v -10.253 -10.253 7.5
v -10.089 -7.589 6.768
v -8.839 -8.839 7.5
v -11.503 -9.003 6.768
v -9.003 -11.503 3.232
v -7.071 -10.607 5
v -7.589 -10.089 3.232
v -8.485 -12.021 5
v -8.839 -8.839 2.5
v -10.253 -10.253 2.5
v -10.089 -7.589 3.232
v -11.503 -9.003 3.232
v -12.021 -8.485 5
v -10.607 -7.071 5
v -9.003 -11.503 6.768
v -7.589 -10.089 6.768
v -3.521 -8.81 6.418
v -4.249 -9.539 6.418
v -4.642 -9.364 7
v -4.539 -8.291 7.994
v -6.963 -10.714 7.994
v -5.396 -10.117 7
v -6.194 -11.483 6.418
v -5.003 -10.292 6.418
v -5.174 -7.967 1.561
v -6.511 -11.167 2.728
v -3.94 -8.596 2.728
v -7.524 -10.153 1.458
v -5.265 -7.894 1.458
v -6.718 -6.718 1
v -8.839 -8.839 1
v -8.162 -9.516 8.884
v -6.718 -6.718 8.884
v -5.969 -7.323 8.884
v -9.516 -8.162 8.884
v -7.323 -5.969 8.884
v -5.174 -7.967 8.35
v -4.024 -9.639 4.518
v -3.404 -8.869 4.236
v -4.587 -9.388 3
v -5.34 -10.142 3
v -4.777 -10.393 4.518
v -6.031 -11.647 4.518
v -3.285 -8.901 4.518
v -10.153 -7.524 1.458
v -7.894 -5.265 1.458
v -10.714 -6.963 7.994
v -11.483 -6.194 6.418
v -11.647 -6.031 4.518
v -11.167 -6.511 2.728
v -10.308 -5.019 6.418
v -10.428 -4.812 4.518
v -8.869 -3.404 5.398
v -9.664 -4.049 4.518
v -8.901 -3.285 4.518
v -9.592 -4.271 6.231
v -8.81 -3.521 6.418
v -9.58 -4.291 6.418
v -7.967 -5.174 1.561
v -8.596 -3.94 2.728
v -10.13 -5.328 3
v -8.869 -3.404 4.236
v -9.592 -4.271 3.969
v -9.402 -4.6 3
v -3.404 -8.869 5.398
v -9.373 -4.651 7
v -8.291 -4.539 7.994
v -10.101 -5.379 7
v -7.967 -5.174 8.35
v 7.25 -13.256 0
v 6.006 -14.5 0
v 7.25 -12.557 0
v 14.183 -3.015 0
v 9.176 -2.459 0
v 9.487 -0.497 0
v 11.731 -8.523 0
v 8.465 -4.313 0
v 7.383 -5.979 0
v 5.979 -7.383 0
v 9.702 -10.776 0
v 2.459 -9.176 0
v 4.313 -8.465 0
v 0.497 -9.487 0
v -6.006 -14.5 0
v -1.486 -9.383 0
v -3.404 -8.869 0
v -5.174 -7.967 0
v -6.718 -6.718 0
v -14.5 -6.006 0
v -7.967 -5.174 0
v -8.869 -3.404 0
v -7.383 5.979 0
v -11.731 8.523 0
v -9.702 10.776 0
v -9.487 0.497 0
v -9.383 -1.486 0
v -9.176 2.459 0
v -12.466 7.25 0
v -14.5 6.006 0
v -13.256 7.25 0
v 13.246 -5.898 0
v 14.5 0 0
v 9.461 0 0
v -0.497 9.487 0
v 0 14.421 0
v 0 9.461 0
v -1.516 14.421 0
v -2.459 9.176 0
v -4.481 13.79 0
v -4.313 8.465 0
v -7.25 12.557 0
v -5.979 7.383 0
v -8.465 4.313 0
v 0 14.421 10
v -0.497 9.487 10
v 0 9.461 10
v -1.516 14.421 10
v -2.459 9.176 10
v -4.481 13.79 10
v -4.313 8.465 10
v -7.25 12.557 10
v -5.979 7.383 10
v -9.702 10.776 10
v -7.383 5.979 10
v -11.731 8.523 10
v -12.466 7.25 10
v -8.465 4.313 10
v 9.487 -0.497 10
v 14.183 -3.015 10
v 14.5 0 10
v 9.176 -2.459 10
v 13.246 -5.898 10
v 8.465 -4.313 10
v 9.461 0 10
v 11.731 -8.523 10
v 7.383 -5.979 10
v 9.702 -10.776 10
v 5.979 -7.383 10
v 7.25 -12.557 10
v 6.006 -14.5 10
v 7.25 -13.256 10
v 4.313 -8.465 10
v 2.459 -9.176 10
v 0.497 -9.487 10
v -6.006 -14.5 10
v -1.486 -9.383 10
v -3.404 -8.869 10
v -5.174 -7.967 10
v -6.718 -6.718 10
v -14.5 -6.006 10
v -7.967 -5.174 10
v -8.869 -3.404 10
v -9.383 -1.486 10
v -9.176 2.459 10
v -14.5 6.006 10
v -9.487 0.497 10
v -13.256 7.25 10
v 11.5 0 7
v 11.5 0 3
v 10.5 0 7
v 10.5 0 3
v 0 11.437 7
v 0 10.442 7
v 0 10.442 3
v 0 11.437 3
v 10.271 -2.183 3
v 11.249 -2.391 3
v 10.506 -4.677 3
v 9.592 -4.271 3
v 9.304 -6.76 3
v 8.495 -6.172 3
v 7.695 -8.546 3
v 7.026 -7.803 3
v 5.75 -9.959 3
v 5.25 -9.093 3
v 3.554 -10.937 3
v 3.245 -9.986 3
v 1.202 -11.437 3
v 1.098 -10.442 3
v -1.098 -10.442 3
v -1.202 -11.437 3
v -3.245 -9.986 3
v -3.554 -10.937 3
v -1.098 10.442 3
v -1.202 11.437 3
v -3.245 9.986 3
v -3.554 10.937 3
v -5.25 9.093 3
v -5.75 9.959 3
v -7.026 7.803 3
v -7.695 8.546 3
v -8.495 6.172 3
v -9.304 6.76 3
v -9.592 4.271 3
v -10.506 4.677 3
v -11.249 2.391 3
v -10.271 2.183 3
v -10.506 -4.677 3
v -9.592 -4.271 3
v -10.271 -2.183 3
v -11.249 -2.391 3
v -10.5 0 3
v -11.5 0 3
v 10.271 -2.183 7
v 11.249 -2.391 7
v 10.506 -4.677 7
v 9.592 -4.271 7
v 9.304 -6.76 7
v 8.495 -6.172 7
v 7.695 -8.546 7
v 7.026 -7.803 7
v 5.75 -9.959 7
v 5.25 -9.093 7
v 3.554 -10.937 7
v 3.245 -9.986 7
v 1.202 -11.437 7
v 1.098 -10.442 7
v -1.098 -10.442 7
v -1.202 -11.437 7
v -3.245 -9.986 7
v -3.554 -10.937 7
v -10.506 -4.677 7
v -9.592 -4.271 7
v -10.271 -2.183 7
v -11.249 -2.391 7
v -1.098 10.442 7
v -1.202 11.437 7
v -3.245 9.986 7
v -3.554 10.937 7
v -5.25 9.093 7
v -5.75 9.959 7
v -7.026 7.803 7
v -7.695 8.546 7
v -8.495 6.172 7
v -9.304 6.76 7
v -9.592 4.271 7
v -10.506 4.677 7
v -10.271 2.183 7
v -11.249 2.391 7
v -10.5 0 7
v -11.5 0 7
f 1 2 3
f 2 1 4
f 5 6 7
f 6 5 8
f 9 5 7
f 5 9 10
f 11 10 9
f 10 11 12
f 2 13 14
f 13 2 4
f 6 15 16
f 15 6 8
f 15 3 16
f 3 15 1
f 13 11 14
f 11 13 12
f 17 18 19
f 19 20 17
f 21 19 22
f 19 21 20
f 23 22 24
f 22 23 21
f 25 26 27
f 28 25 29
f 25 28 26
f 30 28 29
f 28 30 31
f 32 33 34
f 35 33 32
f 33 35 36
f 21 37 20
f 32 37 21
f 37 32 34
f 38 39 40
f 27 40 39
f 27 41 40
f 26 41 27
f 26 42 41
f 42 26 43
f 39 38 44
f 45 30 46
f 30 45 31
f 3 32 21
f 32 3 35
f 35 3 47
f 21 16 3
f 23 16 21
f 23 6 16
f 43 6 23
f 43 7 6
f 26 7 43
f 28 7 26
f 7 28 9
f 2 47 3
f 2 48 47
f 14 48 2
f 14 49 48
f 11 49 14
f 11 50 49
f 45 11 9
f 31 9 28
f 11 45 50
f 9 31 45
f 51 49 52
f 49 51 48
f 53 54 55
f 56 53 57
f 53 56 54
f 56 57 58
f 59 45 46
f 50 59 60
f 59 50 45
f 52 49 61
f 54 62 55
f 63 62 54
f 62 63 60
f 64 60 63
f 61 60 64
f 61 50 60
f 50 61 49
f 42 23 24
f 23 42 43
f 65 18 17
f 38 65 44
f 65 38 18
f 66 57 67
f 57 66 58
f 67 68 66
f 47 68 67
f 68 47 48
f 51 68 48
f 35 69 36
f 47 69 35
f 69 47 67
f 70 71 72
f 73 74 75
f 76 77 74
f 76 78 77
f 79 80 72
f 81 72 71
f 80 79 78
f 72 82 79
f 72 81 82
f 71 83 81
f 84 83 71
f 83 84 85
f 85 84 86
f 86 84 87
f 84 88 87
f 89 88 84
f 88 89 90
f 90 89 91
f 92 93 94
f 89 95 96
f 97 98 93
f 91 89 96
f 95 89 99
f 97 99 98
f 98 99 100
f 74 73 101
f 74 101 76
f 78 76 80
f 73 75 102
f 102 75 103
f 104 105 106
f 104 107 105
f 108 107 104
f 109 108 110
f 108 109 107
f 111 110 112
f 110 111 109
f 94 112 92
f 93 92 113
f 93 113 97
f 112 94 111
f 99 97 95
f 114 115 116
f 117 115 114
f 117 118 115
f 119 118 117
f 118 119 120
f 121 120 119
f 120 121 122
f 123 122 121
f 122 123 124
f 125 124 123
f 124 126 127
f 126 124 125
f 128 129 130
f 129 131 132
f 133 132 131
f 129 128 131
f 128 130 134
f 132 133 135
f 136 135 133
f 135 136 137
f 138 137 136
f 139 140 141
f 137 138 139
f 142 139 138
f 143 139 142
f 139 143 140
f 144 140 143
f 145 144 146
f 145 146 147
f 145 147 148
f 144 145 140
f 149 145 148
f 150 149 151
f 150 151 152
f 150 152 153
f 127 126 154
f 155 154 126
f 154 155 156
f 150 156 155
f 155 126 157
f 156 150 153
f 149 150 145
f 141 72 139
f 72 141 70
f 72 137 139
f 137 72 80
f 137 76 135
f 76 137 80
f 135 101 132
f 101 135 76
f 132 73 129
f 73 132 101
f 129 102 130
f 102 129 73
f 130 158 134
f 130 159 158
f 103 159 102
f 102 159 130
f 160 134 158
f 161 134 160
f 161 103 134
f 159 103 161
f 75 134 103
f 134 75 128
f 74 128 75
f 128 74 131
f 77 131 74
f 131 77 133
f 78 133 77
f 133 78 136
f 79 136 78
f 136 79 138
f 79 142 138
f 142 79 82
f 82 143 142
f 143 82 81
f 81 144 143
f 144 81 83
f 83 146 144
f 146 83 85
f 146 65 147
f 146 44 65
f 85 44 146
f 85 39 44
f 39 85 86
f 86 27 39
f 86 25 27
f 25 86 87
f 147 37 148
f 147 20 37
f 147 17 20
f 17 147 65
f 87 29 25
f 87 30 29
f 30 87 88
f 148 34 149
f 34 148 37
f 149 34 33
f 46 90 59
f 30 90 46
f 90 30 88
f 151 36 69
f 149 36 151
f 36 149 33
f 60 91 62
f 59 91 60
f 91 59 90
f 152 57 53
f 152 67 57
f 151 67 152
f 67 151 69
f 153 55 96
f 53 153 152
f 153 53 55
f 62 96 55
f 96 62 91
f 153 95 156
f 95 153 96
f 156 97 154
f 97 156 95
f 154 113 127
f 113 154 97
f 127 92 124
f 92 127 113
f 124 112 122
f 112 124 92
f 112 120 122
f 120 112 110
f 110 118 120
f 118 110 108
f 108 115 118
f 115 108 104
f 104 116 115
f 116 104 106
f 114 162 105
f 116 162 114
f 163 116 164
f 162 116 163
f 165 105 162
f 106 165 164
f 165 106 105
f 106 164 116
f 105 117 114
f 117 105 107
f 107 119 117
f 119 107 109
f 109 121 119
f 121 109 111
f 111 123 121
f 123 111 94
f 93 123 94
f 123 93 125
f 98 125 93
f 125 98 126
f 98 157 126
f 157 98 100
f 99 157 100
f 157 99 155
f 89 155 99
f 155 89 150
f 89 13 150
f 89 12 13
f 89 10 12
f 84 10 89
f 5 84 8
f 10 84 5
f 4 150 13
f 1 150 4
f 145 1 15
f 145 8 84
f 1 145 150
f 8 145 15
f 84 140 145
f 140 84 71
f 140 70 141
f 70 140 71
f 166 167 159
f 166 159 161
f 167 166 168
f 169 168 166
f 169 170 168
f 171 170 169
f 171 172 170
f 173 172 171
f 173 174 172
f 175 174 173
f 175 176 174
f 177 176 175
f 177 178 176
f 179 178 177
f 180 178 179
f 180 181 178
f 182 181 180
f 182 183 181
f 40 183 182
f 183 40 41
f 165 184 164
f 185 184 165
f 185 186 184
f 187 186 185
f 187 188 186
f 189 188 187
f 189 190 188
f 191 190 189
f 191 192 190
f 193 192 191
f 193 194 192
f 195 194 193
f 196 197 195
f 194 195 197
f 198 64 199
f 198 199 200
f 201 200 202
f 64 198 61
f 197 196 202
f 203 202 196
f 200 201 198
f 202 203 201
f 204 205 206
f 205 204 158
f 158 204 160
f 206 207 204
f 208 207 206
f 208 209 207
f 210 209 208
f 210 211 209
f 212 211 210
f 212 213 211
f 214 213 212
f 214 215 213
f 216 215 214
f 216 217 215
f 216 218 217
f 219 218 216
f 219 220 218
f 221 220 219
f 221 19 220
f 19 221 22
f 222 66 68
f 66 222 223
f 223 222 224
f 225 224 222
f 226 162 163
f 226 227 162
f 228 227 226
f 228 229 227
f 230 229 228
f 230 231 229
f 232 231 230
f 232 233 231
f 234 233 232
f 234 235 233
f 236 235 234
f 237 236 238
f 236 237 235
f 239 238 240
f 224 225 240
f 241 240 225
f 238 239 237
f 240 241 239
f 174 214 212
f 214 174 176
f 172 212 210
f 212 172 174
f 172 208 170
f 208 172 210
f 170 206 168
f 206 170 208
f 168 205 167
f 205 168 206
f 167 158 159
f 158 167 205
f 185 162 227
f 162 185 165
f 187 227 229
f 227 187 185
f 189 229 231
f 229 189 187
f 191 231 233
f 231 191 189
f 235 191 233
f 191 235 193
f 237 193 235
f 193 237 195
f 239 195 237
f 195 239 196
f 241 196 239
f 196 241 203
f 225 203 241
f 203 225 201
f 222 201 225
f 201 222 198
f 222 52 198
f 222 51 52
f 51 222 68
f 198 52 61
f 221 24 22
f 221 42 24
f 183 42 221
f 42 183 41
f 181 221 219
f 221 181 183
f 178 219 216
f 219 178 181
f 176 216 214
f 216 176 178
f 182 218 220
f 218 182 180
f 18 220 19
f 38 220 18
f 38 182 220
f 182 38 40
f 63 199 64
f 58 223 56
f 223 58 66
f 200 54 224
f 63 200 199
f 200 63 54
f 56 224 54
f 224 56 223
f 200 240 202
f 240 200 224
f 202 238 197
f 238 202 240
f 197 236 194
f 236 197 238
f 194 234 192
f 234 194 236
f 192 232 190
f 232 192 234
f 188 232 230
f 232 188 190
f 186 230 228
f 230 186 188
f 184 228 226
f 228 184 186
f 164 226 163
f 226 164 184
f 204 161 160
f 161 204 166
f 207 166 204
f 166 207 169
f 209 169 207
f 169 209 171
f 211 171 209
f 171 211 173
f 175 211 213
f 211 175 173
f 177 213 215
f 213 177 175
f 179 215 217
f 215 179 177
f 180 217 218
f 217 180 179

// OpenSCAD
/* Clip to hold the cable trunking up each side of the windscreen */

length = 10;
thickness = 5;
cable_diameter = 19;
cross_section = cable_diameter + 2 * thickness;
screw_size=5;
screw_head_size=8;
screw_head_depth=3;

cable_tie_thickness = 2;
cable_tie_width = 4;
cable_tie_depth = 2;

module screw_hole() {
     translate([0, 0, length/2]) rotate([135, 90, 0]) {
          cylinder(d=screw_size, h=cross_section);
          cylinder(d=screw_head_size, h=cable_diameter/2 + screw_head_depth);
     }
}

module cable_tie_channel() {
     translate([0, 0, (length-cable_tie_width)/2]) {
          linear_extrude(cable_tie_width) {
               difference() {
                    circle(d=cable_diameter+cable_tie_depth+cable_tie_thickness);
                    circle(d=cable_diameter+cable_tie_depth);
               }
          }
     }
}

module clip_body() {
     linear_extrude(length) {
          difference() {
               intersection() {
                    union() {
                         circle(d=cross_section);
                         /* the part that fits in the windscreen channel */
                         translate([-3*cross_section/4, -3*cross_section/4]) square(cross_section);
                    }
                    /* clip diagonally to fit in corner */
                    rotate([0, 0, 45]) {
                         difference() {
                              square(cross_section, center=true);
                              /* cut out the centre */
                              circle(d=cable_diameter);
                         }
                    }
                    /* clip off corners diagonally */
                    square(cross_section, center=true);
               }
               /* make it an open clip, rather than a closed circle */
               square(cross_section);
          }
     }
}

module cable_clip() {
     difference() {
          clip_body();

          screw_hole();

          cable_tie_channel();
     }
}

cable_clip();
